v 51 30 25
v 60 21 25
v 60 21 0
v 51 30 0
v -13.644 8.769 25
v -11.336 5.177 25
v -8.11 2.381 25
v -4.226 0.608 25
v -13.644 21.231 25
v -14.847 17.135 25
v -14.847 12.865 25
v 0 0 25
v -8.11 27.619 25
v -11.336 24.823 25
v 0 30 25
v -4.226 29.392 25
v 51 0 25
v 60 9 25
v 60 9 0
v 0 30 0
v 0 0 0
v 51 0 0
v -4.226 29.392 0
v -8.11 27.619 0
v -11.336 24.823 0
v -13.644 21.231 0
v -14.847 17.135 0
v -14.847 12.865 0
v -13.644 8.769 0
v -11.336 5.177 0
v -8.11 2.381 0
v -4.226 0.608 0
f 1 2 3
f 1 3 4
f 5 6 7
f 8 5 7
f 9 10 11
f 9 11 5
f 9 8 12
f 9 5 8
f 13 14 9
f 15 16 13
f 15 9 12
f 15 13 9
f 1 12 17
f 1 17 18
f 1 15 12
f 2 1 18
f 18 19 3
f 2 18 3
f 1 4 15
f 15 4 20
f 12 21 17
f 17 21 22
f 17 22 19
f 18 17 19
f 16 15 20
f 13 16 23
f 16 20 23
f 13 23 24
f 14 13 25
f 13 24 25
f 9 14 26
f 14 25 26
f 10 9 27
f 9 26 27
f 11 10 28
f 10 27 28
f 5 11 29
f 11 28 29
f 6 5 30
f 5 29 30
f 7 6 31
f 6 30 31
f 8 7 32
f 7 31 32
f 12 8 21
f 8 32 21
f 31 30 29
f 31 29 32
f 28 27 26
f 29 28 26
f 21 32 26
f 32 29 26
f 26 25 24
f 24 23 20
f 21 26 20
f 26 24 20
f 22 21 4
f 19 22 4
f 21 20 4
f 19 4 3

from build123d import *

# Parameters (mm, degrees)
F1_DEPTH = 25


with BuildPart() as f1:
    # F0 (on Top) → F1 (new body)
    with BuildSketch(Plane.XY):
        with BuildLine():
            ThreePointArc((0, 30), (-15, 15), (0, 0))
            Line((0, 0), (51, 0))
            Line((51, 0), (60, 9))
            Line((60, 9), (60, 21))
            Line((60, 21), (51, 30))
            Line((51, 30), (0, 30))
        make_face()
    extrude(amount=F1_DEPTH)


solid = f1.part
